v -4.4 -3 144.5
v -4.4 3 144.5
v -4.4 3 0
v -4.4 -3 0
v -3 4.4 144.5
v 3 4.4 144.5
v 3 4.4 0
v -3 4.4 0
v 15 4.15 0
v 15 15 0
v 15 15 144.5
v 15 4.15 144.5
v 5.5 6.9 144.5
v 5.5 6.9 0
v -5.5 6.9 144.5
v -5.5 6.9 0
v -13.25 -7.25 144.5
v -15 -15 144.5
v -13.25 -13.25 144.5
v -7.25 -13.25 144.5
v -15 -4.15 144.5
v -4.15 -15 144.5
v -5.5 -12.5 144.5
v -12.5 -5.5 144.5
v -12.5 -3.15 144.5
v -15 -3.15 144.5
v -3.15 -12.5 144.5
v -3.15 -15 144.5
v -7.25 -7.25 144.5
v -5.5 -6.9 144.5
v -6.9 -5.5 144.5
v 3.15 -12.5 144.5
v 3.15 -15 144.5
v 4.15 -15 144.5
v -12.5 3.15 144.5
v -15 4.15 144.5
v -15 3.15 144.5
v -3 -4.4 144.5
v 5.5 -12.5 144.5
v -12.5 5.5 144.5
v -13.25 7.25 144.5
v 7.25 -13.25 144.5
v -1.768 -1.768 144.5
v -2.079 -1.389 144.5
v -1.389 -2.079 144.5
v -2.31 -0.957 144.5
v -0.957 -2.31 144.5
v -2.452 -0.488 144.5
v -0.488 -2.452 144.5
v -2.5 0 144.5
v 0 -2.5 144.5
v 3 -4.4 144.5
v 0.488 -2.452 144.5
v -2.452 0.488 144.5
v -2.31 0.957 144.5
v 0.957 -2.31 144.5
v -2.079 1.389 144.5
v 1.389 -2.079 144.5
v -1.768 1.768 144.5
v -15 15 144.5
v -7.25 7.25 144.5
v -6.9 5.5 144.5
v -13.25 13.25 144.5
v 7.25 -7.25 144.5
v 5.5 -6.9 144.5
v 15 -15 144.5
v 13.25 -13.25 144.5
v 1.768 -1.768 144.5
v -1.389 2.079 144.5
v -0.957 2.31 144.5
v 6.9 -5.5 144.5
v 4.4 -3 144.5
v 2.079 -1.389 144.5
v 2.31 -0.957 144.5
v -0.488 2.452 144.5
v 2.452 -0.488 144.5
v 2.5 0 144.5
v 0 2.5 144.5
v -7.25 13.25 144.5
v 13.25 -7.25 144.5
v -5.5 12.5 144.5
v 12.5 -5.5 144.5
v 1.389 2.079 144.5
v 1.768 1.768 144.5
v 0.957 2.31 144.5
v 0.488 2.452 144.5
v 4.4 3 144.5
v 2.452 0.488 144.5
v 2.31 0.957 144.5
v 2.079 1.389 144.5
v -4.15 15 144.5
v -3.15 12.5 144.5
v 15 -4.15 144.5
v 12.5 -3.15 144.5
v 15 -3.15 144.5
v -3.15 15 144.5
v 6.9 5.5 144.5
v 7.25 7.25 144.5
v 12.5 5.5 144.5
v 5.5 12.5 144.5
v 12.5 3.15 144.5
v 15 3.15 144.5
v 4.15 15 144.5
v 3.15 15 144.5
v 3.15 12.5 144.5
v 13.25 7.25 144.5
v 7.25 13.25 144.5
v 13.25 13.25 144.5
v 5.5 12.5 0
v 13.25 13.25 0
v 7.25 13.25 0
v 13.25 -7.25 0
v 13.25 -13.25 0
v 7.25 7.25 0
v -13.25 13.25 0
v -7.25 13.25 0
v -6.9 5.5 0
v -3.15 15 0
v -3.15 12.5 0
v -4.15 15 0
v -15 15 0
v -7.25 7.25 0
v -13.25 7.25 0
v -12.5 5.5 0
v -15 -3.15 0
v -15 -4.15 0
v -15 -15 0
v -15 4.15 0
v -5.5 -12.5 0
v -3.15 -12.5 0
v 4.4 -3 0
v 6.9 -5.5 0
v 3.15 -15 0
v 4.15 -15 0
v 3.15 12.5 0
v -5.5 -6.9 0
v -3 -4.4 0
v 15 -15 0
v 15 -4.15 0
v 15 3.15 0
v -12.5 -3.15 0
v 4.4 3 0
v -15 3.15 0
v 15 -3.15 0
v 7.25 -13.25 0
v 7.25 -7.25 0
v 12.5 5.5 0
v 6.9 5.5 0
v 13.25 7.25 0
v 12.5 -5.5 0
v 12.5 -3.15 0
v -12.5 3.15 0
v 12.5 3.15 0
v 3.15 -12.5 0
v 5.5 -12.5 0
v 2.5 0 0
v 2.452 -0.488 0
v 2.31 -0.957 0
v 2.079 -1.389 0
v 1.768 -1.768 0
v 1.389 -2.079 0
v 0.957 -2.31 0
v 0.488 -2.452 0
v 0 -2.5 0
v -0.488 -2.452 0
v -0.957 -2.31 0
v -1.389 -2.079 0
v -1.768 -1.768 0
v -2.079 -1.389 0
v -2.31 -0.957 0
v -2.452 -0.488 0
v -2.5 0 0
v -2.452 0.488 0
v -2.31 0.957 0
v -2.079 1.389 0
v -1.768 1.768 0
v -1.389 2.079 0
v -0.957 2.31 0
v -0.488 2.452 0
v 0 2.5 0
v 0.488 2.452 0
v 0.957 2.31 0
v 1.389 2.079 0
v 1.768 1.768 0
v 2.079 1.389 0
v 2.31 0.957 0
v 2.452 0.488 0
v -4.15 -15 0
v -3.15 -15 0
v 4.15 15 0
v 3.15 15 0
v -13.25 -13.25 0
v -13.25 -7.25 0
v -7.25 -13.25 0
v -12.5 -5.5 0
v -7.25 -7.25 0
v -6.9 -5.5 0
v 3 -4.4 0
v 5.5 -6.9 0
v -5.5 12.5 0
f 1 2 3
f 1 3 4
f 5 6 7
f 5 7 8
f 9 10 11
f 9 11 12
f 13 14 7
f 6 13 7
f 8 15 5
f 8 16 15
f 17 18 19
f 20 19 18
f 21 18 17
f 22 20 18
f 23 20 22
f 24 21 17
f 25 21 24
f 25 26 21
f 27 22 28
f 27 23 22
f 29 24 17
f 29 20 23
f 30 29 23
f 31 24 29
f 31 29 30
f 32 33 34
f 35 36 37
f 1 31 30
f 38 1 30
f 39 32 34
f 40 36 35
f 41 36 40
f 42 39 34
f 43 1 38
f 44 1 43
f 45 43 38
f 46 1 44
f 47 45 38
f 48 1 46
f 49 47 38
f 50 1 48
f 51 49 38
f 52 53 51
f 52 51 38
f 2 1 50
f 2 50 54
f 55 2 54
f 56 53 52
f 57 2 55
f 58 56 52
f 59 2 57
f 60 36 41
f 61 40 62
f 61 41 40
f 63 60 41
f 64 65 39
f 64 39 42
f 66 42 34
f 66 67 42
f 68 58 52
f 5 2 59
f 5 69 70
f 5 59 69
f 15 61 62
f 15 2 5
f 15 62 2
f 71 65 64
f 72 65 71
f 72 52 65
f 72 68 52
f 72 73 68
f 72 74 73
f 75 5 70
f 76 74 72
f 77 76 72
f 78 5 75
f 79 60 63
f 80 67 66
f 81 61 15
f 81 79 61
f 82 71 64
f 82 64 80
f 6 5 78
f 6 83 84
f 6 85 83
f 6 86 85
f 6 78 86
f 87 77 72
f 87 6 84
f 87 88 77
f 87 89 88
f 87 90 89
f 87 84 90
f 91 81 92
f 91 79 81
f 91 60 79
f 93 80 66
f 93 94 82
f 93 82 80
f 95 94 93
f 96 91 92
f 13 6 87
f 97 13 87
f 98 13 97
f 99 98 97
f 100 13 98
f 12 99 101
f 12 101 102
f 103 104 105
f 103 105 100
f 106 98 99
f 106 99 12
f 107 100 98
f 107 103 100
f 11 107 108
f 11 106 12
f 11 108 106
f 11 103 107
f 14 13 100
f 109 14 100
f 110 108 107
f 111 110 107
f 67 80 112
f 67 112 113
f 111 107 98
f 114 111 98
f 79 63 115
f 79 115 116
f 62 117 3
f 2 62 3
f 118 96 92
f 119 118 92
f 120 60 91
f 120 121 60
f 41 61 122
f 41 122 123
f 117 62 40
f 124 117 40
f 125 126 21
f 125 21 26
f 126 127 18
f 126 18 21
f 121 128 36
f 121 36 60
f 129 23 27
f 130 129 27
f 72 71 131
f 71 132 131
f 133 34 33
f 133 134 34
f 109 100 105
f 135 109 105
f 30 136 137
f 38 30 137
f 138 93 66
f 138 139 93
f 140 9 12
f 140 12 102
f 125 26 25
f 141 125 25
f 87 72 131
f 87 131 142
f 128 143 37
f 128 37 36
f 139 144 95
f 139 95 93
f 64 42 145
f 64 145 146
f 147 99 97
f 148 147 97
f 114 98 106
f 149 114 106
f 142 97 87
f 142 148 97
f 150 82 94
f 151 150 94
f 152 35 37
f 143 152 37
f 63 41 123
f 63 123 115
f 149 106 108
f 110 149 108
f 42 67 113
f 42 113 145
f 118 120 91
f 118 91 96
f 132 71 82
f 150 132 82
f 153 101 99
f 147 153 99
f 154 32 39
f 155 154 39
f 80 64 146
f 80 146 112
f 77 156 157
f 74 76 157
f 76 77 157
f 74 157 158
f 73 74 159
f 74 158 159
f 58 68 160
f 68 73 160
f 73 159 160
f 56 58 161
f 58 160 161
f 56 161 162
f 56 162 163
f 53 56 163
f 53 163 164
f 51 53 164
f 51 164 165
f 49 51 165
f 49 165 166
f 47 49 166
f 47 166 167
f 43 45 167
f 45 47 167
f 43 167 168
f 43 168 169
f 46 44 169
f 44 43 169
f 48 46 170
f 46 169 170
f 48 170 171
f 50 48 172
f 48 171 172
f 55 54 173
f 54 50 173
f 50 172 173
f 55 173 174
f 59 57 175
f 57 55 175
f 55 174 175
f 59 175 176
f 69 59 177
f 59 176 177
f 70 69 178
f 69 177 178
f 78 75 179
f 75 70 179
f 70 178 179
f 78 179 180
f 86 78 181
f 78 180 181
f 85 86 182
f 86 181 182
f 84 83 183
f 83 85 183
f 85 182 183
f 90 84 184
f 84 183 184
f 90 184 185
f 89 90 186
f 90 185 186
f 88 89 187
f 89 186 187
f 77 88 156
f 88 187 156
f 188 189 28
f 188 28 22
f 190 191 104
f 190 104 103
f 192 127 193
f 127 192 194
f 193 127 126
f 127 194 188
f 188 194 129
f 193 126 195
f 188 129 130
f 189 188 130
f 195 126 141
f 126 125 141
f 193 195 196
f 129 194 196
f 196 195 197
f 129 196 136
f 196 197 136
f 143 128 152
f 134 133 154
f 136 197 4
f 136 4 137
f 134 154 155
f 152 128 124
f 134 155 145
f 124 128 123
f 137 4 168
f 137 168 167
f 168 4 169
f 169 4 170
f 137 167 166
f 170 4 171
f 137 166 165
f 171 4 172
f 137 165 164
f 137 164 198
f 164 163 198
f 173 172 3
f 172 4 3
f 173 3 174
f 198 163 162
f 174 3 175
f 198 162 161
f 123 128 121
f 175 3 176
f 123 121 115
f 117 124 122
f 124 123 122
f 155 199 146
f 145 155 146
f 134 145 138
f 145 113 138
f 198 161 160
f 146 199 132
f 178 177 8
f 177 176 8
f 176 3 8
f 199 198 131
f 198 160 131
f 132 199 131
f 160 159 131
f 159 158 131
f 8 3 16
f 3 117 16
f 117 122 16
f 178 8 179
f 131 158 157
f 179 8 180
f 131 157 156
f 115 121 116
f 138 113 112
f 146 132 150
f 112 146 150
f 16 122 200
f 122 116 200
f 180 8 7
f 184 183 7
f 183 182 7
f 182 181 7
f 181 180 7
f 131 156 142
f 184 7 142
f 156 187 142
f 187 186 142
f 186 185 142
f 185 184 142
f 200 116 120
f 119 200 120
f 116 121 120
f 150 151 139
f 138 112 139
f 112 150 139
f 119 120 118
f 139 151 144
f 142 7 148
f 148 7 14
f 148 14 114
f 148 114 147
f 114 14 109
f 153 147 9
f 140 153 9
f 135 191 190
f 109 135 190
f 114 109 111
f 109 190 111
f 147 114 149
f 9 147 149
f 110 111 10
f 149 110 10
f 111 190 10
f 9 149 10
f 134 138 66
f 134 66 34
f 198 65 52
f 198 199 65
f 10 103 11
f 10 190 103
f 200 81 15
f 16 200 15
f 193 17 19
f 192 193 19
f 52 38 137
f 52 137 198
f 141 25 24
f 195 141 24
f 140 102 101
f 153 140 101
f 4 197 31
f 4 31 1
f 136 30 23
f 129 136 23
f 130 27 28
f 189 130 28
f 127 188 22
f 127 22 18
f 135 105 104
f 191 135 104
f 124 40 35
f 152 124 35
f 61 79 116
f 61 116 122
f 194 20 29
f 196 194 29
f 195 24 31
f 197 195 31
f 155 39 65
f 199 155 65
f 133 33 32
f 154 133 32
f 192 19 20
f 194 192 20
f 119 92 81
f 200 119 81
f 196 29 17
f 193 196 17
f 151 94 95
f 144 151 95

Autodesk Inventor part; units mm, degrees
ref_plane "YZ Plane" through (0, 0, 0) normal (1, 0, 0) x (0, 1, 0)
ref_plane "XZ Plane" through (0, 0, 0) normal (0, 1, 0) x (-1, 0, 0)
ref_plane "XY Plane" through (0, 0, 0) normal (0, 0, 1) x (1, 0, 0)
sketch "스케치1" plane through (0, 0, 0) normal (0, 0, 1) x (1, 0, 0)
  line L0 (15, -15) -> (-15, -15)
  line L1 (-15, -15) -> (-15, 15)
  line L2 (-15, 15) -> (15, 15)
  line L3 (15, 15) -> (15, -15)
  circle A0 centre (0, 0) radius 2.5
  line L4 (-3.15, -15) -> (3.15, -15)
  line L5 (-4.15, -15) -> (4.15, -15)
  line L6 (3.15, -15) -> (3.15, -12.5)
  line L7 (-3.15, -12.5) -> (-3.15, -15)
  line L8 (-5.5, -12.5) -> (5.5, -12.5)
  line L9 (5.5, -12.5) -> (5.5, -6.9)
  line L10 (-5.5, -6.9) -> (-5.5, -12.5)
  line L11 (-5.5, -6.9) -> (-3, -4.4)
  line L12 (5.5, -6.9) -> (3, -4.4)
  line L13 (-3, -4.4) -> (3, -4.4)
  line L14 (-13.25, -13.25) -> (-7.25, -13.25)
  line L15 (-7.25, -13.25) -> (-7.25, -7.25)
  line L16 (-7.25, -7.25) -> (-13.25, -7.25)
  line L17 (-13.25, -7.25) -> (-13.25, -13.25)
  line L18 (0, 0) -> (-1, 0)
  line L19 (0, 0) -> (0, -1)
  line L20 (13.25, -13.25) -> (7.25, -13.25)
  line L21 (7.25, -13.25) -> (7.25, -7.25)
  line L22 (7.25, -7.25) -> (13.25, -7.25)
  line L23 (13.25, -7.25) -> (13.25, -13.25)
  line L24 (-13.25, 13.25) -> (-7.25, 13.25)
  line L25 (-7.25, 13.25) -> (-7.25, 7.25)
  line L26 (-7.25, 7.25) -> (-13.25, 7.25)
  line L27 (-13.25, 7.25) -> (-13.25, 13.25)
  line L28 (13.25, 7.25) -> (13.25, 13.25)
  line L29 (13.25, 13.25) -> (7.25, 13.25)
  line L30 (7.25, 13.25) -> (7.25, 7.25)
  line L31 (7.25, 7.25) -> (13.25, 7.25)
  line L32 (6.9, 5.5) -> (4.4, 3)
  line L33 (12.5, 5.5) -> (6.9, 5.5)
  line L34 (15, -3.15) -> (15, 3.15)
  line L35 (15, -4.15) -> (15, 4.15)
  line L36 (15, 3.15) -> (12.5, 3.15)
  line L37 (12.5, -3.15) -> (15, -3.15)
  line L38 (12.5, -5.5) -> (12.5, 5.5)
  line L39 (6.9, -5.5) -> (12.5, -5.5)
  line L40 (4.4, -3) -> (4.4, 3)
  line L41 (6.9, -5.5) -> (4.4, -3)
  line L42 (-5.5, 6.9) -> (-3, 4.4)
  line L43 (-5.5, 12.5) -> (-5.5, 6.9)
  line L44 (3.15, 15) -> (-3.15, 15)
  line L45 (4.15, 15) -> (-4.15, 15)
  line L46 (-3.15, 15) -> (-3.15, 12.5)
  line L47 (3.15, 12.5) -> (3.15, 15)
  line L48 (5.5, 12.5) -> (-5.5, 12.5)
  line L49 (5.5, 6.9) -> (5.5, 12.5)
  line L50 (3, 4.4) -> (-3, 4.4)
  line L51 (5.5, 6.9) -> (3, 4.4)
  line L52 (-6.9, -5.5) -> (-4.4, -3)
  line L53 (-12.5, -5.5) -> (-6.9, -5.5)
  line L54 (-15, 3.15) -> (-15, -3.15)
  line L55 (-15, 4.15) -> (-15, -4.15)
  line L56 (-15, -3.15) -> (-12.5, -3.15)
  line L57 (-12.5, 3.15) -> (-15, 3.15)
  line L58 (-12.5, 5.5) -> (-12.5, -5.5)
  line L59 (-6.9, 5.5) -> (-12.5, 5.5)
  line L60 (-4.4, 3) -> (-4.4, -3)
  line L61 (-6.9, 5.5) -> (-4.4, 3)
  dimension "d0" = 30
  dimension "d1" = 30
  dimension "d4" = 6.3
  dimension "d20" = 6
  dimension "d21" = 6
  dimension "d22" = 1
  dimension "d23" = 1
  dimension "d26" = 360
extrude "돌출1" add sketch "스케치1" along normal blind 144.5 contours L0 L6 L8 L9 L12 L13 L11 L10 L7 L1 L56 L58 L53 L52 L60 L61 L59 L57 L2 L46 L48 L43 L42 L50 L51 L49 L47 L3 L36 L38 L33 L32 L40 L41 L39 L37
properties part number "profile" material "알루미늄 6061"
